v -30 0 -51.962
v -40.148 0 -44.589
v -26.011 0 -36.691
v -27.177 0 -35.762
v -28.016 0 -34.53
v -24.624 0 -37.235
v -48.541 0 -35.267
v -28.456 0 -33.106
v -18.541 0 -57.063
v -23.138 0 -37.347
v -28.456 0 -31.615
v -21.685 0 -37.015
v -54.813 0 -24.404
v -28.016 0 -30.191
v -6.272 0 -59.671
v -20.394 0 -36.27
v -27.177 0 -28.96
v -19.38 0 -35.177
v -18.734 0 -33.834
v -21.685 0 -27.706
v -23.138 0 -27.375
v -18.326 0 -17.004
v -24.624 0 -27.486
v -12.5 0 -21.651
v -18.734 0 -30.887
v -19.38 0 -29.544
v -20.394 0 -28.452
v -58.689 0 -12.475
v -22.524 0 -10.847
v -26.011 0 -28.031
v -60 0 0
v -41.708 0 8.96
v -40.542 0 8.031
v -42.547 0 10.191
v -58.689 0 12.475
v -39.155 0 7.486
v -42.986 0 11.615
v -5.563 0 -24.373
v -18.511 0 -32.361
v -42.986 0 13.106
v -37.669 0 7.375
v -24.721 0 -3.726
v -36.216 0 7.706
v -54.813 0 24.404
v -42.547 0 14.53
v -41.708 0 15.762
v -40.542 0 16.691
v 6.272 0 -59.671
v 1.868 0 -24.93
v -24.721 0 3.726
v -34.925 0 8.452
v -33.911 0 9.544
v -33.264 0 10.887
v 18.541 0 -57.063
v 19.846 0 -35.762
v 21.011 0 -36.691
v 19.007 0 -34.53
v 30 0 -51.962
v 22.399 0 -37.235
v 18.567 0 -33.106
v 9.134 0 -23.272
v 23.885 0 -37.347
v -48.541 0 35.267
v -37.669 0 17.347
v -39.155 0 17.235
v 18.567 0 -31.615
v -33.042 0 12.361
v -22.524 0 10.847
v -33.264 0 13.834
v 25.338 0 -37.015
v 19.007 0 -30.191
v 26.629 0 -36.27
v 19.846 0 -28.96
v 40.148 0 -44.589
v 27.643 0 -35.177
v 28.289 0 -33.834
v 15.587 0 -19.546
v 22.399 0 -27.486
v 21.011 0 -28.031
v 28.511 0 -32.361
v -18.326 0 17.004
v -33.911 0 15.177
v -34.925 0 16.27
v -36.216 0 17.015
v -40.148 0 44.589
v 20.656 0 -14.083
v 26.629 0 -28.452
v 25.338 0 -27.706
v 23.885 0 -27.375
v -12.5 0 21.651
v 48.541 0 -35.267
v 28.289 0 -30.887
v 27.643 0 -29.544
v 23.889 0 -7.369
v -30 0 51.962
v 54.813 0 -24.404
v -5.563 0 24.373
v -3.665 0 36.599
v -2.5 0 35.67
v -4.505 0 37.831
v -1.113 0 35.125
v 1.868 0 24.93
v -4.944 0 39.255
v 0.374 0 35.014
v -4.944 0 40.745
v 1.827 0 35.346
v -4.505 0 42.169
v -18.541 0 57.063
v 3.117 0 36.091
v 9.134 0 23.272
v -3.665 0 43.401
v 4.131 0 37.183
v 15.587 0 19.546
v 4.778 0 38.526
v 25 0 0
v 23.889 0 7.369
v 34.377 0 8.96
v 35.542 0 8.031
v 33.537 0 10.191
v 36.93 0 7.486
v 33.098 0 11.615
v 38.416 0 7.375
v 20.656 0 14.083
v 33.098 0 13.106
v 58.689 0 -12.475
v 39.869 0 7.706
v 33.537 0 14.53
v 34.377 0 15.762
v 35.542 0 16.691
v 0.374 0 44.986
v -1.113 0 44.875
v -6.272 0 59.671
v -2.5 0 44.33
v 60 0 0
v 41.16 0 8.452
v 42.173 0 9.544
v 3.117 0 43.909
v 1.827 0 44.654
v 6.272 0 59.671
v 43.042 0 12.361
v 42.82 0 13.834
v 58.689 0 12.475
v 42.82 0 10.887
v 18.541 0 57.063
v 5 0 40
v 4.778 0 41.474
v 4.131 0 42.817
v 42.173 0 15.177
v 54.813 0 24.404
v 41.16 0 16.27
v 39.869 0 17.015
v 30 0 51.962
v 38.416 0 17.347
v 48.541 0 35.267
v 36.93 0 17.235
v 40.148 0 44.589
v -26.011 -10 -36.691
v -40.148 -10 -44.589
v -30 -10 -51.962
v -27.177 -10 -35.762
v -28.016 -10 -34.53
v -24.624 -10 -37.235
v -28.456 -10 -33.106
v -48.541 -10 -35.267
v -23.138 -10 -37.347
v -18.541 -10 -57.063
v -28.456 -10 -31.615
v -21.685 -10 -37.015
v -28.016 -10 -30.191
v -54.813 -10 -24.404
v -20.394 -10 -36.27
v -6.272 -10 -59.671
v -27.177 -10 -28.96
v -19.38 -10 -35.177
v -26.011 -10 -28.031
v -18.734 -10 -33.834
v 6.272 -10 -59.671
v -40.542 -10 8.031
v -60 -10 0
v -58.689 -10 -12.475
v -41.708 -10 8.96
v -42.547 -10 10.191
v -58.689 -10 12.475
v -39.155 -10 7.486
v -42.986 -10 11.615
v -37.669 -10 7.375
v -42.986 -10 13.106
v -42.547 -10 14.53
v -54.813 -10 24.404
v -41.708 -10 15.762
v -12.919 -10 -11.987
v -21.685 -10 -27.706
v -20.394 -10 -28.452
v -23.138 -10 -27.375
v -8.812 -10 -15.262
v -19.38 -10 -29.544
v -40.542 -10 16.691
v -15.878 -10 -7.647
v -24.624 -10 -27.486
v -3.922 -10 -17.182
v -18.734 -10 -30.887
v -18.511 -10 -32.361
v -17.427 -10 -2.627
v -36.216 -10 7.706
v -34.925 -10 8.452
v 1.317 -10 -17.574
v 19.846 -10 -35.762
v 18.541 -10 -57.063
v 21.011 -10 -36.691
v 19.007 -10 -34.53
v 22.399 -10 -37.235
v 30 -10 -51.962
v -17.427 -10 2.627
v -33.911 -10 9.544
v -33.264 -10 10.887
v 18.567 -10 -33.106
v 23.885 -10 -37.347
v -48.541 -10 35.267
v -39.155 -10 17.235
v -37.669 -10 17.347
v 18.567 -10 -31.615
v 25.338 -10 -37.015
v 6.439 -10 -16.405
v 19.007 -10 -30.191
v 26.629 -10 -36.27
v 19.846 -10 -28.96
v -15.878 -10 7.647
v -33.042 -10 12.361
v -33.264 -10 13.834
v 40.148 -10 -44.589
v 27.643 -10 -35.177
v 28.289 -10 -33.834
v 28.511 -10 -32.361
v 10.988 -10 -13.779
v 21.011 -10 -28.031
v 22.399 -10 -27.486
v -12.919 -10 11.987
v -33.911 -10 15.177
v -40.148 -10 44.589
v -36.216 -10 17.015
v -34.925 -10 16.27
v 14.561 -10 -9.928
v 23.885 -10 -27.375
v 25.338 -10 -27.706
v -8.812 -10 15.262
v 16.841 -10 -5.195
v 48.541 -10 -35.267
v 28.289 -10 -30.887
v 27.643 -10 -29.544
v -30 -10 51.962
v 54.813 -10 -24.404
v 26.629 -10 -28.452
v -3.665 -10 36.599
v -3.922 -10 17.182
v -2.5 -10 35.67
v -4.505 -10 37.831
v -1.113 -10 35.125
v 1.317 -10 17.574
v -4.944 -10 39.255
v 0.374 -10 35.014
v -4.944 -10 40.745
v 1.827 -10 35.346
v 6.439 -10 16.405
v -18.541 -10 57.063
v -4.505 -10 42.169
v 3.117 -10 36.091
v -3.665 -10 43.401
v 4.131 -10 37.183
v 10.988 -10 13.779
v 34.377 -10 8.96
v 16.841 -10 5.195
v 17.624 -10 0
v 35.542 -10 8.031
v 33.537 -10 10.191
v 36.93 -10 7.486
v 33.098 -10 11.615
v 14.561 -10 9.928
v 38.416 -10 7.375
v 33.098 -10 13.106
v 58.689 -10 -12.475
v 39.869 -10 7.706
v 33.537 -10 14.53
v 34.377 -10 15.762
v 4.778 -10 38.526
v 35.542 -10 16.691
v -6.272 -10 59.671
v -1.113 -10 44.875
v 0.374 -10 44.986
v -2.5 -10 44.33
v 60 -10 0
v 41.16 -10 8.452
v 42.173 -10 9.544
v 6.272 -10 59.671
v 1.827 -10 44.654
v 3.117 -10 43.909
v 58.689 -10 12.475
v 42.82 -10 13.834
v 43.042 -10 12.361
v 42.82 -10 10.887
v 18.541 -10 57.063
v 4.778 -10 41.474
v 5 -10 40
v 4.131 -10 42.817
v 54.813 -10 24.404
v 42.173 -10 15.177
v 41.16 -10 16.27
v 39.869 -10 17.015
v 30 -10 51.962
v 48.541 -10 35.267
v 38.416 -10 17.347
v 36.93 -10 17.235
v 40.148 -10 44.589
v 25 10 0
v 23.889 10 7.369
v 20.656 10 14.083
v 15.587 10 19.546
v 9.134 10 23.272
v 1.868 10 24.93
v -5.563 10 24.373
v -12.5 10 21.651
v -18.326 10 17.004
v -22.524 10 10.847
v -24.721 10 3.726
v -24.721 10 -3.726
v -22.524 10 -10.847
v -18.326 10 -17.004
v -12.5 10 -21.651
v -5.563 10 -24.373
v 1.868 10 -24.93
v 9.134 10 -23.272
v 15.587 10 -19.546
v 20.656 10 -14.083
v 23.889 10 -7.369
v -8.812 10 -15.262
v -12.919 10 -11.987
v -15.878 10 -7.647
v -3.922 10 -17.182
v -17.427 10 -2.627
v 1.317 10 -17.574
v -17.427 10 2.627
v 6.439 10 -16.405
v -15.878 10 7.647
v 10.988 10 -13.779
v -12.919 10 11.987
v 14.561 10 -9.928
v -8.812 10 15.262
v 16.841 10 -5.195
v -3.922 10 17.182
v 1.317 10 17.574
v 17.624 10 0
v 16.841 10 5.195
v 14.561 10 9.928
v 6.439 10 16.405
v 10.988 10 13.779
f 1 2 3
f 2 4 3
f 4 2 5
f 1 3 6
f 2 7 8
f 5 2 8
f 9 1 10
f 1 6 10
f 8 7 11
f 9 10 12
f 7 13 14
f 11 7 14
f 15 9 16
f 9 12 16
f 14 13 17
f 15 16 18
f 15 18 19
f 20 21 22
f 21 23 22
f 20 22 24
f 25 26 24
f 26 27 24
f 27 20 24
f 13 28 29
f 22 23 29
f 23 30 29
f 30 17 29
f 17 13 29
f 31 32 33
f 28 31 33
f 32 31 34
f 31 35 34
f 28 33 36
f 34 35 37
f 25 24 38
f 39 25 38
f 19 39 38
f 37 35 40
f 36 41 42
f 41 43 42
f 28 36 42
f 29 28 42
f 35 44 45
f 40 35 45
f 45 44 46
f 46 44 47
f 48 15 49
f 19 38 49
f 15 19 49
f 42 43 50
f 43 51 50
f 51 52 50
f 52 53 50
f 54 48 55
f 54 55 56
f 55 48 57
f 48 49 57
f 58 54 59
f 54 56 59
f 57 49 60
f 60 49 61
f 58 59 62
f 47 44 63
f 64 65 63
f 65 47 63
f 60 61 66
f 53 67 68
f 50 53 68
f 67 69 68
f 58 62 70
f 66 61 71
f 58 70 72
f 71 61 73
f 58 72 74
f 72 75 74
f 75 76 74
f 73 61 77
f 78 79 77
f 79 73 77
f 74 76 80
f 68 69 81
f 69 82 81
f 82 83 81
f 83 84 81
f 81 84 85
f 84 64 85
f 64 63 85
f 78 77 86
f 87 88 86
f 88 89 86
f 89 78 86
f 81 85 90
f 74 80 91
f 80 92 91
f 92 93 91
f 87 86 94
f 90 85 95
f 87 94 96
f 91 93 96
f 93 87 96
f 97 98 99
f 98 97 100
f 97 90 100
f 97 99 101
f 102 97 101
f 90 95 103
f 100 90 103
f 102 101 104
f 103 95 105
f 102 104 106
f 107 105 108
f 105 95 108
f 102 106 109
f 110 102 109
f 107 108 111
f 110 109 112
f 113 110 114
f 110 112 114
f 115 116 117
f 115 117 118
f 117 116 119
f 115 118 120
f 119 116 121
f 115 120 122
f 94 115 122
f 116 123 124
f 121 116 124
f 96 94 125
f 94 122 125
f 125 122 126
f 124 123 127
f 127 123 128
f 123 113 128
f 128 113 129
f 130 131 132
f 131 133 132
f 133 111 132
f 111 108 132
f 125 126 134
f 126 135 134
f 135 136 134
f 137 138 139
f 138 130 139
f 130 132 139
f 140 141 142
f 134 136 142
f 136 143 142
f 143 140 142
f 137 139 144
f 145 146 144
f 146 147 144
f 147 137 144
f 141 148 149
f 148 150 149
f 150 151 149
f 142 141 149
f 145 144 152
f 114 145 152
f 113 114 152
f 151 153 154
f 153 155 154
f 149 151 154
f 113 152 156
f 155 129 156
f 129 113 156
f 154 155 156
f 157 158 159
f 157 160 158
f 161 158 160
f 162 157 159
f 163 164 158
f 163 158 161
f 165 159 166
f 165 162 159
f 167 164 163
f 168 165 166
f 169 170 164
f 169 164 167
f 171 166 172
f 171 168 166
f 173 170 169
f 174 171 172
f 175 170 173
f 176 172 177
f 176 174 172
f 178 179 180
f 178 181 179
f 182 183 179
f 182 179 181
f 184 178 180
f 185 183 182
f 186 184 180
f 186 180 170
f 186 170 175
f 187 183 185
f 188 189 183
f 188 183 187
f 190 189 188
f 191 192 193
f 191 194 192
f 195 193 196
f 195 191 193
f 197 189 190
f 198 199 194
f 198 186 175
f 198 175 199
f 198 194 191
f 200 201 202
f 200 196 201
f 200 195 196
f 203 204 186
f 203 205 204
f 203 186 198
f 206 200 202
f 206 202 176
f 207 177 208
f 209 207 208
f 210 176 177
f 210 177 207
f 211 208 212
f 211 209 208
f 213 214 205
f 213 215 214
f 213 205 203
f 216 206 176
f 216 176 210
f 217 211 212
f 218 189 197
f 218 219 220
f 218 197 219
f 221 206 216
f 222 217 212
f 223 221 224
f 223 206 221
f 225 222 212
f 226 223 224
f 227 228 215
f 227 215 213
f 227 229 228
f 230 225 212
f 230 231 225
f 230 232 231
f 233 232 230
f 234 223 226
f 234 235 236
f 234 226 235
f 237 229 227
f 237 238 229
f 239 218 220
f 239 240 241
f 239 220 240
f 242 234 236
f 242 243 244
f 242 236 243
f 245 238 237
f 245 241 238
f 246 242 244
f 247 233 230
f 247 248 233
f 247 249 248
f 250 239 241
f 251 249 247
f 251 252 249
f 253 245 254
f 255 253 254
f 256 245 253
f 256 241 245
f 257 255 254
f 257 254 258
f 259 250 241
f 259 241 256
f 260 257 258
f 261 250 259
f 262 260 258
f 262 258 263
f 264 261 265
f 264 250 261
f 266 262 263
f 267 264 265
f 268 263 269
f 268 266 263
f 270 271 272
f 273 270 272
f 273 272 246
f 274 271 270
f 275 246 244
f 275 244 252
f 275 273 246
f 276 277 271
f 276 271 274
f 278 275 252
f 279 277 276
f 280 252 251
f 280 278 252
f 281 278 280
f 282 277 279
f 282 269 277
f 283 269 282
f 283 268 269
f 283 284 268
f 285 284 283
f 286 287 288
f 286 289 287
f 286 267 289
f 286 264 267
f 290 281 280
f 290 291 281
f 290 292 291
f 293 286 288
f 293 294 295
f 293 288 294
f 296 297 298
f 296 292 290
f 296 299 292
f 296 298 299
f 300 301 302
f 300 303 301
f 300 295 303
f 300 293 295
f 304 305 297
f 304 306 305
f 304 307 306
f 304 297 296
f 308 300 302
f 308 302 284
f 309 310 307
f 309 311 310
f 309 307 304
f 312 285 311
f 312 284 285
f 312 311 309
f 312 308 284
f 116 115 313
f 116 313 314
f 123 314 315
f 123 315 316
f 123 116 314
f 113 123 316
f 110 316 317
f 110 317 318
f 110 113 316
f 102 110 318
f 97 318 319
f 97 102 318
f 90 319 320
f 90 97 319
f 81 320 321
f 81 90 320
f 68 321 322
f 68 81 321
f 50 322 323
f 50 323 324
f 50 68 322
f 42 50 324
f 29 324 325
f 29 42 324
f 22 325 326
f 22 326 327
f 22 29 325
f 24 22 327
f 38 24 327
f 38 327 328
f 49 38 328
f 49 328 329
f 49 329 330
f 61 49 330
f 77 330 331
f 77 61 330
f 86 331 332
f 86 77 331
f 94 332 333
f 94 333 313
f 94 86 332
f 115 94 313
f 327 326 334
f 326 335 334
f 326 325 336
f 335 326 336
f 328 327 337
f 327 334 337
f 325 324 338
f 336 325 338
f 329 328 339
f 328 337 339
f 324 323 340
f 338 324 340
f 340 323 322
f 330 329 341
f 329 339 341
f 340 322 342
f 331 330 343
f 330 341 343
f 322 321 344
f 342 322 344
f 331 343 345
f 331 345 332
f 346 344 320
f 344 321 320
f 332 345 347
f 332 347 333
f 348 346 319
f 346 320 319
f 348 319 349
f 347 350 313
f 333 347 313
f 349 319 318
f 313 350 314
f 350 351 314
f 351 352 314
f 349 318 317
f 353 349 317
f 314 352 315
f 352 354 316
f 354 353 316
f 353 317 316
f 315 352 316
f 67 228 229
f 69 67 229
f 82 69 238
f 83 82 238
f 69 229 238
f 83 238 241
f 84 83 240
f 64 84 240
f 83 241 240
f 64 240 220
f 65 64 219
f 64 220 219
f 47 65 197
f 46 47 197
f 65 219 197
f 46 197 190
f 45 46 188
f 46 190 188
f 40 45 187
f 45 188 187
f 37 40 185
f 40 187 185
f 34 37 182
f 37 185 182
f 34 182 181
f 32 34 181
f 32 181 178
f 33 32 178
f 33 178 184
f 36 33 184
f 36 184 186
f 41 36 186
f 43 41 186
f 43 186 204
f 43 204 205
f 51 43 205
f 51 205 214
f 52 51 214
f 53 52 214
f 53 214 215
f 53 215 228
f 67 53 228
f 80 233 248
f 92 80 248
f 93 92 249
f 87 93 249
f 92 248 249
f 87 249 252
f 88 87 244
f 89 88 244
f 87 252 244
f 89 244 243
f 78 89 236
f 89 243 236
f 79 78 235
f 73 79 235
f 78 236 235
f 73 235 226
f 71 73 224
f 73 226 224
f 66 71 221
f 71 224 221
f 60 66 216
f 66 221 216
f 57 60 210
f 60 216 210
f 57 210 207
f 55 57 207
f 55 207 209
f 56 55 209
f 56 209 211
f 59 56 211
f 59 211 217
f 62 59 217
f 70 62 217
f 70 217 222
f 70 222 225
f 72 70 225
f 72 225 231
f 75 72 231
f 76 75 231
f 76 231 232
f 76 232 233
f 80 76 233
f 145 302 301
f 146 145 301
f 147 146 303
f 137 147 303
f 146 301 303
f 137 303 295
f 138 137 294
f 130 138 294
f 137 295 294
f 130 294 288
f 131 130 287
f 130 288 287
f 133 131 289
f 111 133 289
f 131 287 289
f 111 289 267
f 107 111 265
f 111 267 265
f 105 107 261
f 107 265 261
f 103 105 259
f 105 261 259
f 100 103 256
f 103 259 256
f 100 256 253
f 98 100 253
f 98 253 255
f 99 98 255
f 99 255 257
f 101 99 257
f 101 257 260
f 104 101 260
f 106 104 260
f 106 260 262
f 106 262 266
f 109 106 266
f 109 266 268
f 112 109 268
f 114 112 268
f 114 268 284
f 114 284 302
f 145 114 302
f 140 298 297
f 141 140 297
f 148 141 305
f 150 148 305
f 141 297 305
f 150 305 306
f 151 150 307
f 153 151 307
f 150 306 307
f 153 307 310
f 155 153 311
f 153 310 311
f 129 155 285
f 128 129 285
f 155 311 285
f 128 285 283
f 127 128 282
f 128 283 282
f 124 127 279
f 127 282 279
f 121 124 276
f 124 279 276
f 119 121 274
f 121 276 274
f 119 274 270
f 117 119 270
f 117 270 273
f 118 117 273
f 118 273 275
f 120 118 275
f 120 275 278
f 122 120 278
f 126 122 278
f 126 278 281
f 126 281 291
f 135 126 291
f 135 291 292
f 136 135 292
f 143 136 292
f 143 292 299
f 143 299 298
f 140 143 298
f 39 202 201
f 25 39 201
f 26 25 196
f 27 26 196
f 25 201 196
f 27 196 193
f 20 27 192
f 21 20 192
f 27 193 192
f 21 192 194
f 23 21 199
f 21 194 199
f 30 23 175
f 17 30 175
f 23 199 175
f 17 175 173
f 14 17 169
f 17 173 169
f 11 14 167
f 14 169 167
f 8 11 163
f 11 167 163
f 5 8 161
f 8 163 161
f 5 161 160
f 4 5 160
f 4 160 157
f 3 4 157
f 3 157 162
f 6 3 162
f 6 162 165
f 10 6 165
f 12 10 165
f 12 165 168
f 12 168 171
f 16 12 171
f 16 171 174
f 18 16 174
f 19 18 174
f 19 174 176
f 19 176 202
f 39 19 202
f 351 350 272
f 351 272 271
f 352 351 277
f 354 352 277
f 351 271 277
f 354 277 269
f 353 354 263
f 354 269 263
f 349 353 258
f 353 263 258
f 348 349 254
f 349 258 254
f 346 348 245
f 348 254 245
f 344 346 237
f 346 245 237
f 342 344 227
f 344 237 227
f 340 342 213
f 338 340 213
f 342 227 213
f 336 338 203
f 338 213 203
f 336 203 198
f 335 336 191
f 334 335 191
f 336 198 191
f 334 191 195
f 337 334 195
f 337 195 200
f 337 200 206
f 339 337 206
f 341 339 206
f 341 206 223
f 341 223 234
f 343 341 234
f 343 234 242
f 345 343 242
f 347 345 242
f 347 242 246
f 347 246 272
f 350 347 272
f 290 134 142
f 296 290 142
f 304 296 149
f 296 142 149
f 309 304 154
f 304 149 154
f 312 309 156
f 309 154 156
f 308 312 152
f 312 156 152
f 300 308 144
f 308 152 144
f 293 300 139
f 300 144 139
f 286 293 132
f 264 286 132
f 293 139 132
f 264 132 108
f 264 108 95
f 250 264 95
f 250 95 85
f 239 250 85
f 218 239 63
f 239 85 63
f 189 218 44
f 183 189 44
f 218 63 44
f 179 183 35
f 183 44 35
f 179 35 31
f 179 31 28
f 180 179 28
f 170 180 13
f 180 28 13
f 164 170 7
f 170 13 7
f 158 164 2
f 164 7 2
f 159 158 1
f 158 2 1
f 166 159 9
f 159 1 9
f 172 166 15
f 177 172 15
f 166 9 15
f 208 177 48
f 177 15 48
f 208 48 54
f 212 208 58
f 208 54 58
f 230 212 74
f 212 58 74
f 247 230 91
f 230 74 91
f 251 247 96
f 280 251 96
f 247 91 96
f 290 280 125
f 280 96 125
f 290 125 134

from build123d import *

# Parameters (mm, degrees)
F0_R     = 25
F1_DEPTH = 10
F2_R     = 60
F3_DEPTH = 10
F4_R     = 5
F5_DEPTH = 20.001
F6_R     = 17.6235
F7_DEPTH = 50


with BuildPart() as f1:
    # F0 (on Front) → F1 (new body)
    with BuildSketch(Plane.XZ):
        Circle(F0_R)
    extrude(amount=-F1_DEPTH)

    # F2 (on Front) → F3 (join)
    with BuildSketch(Plane.XZ):
        Circle(F2_R)
    extrude(amount=F3_DEPTH)

    # F4 (on face) → F5 (cut, through all)
    with BuildSketch(Plane.XZ.offset(10)):
        with Locations((0, 40)):
            Circle(F4_R)
        with Locations((-38.042261, 12.36068)):
            Circle(F4_R)
        with Locations((-23.51141, -32.36068)):
            Circle(F4_R)
        with Locations((23.51141, -32.36068)):
            Circle(F4_R)
        with Locations((38.042261, 12.36068)):
            Circle(F4_R)
    extrude(amount=-F5_DEPTH, mode=Mode.SUBTRACT)

    # F6 (on face) → F7 (cut)
    with BuildSketch(Plane.XZ.offset(10)):
        Circle(F6_R)
    extrude(amount=-F7_DEPTH, mode=Mode.SUBTRACT)


solid = f1.part
